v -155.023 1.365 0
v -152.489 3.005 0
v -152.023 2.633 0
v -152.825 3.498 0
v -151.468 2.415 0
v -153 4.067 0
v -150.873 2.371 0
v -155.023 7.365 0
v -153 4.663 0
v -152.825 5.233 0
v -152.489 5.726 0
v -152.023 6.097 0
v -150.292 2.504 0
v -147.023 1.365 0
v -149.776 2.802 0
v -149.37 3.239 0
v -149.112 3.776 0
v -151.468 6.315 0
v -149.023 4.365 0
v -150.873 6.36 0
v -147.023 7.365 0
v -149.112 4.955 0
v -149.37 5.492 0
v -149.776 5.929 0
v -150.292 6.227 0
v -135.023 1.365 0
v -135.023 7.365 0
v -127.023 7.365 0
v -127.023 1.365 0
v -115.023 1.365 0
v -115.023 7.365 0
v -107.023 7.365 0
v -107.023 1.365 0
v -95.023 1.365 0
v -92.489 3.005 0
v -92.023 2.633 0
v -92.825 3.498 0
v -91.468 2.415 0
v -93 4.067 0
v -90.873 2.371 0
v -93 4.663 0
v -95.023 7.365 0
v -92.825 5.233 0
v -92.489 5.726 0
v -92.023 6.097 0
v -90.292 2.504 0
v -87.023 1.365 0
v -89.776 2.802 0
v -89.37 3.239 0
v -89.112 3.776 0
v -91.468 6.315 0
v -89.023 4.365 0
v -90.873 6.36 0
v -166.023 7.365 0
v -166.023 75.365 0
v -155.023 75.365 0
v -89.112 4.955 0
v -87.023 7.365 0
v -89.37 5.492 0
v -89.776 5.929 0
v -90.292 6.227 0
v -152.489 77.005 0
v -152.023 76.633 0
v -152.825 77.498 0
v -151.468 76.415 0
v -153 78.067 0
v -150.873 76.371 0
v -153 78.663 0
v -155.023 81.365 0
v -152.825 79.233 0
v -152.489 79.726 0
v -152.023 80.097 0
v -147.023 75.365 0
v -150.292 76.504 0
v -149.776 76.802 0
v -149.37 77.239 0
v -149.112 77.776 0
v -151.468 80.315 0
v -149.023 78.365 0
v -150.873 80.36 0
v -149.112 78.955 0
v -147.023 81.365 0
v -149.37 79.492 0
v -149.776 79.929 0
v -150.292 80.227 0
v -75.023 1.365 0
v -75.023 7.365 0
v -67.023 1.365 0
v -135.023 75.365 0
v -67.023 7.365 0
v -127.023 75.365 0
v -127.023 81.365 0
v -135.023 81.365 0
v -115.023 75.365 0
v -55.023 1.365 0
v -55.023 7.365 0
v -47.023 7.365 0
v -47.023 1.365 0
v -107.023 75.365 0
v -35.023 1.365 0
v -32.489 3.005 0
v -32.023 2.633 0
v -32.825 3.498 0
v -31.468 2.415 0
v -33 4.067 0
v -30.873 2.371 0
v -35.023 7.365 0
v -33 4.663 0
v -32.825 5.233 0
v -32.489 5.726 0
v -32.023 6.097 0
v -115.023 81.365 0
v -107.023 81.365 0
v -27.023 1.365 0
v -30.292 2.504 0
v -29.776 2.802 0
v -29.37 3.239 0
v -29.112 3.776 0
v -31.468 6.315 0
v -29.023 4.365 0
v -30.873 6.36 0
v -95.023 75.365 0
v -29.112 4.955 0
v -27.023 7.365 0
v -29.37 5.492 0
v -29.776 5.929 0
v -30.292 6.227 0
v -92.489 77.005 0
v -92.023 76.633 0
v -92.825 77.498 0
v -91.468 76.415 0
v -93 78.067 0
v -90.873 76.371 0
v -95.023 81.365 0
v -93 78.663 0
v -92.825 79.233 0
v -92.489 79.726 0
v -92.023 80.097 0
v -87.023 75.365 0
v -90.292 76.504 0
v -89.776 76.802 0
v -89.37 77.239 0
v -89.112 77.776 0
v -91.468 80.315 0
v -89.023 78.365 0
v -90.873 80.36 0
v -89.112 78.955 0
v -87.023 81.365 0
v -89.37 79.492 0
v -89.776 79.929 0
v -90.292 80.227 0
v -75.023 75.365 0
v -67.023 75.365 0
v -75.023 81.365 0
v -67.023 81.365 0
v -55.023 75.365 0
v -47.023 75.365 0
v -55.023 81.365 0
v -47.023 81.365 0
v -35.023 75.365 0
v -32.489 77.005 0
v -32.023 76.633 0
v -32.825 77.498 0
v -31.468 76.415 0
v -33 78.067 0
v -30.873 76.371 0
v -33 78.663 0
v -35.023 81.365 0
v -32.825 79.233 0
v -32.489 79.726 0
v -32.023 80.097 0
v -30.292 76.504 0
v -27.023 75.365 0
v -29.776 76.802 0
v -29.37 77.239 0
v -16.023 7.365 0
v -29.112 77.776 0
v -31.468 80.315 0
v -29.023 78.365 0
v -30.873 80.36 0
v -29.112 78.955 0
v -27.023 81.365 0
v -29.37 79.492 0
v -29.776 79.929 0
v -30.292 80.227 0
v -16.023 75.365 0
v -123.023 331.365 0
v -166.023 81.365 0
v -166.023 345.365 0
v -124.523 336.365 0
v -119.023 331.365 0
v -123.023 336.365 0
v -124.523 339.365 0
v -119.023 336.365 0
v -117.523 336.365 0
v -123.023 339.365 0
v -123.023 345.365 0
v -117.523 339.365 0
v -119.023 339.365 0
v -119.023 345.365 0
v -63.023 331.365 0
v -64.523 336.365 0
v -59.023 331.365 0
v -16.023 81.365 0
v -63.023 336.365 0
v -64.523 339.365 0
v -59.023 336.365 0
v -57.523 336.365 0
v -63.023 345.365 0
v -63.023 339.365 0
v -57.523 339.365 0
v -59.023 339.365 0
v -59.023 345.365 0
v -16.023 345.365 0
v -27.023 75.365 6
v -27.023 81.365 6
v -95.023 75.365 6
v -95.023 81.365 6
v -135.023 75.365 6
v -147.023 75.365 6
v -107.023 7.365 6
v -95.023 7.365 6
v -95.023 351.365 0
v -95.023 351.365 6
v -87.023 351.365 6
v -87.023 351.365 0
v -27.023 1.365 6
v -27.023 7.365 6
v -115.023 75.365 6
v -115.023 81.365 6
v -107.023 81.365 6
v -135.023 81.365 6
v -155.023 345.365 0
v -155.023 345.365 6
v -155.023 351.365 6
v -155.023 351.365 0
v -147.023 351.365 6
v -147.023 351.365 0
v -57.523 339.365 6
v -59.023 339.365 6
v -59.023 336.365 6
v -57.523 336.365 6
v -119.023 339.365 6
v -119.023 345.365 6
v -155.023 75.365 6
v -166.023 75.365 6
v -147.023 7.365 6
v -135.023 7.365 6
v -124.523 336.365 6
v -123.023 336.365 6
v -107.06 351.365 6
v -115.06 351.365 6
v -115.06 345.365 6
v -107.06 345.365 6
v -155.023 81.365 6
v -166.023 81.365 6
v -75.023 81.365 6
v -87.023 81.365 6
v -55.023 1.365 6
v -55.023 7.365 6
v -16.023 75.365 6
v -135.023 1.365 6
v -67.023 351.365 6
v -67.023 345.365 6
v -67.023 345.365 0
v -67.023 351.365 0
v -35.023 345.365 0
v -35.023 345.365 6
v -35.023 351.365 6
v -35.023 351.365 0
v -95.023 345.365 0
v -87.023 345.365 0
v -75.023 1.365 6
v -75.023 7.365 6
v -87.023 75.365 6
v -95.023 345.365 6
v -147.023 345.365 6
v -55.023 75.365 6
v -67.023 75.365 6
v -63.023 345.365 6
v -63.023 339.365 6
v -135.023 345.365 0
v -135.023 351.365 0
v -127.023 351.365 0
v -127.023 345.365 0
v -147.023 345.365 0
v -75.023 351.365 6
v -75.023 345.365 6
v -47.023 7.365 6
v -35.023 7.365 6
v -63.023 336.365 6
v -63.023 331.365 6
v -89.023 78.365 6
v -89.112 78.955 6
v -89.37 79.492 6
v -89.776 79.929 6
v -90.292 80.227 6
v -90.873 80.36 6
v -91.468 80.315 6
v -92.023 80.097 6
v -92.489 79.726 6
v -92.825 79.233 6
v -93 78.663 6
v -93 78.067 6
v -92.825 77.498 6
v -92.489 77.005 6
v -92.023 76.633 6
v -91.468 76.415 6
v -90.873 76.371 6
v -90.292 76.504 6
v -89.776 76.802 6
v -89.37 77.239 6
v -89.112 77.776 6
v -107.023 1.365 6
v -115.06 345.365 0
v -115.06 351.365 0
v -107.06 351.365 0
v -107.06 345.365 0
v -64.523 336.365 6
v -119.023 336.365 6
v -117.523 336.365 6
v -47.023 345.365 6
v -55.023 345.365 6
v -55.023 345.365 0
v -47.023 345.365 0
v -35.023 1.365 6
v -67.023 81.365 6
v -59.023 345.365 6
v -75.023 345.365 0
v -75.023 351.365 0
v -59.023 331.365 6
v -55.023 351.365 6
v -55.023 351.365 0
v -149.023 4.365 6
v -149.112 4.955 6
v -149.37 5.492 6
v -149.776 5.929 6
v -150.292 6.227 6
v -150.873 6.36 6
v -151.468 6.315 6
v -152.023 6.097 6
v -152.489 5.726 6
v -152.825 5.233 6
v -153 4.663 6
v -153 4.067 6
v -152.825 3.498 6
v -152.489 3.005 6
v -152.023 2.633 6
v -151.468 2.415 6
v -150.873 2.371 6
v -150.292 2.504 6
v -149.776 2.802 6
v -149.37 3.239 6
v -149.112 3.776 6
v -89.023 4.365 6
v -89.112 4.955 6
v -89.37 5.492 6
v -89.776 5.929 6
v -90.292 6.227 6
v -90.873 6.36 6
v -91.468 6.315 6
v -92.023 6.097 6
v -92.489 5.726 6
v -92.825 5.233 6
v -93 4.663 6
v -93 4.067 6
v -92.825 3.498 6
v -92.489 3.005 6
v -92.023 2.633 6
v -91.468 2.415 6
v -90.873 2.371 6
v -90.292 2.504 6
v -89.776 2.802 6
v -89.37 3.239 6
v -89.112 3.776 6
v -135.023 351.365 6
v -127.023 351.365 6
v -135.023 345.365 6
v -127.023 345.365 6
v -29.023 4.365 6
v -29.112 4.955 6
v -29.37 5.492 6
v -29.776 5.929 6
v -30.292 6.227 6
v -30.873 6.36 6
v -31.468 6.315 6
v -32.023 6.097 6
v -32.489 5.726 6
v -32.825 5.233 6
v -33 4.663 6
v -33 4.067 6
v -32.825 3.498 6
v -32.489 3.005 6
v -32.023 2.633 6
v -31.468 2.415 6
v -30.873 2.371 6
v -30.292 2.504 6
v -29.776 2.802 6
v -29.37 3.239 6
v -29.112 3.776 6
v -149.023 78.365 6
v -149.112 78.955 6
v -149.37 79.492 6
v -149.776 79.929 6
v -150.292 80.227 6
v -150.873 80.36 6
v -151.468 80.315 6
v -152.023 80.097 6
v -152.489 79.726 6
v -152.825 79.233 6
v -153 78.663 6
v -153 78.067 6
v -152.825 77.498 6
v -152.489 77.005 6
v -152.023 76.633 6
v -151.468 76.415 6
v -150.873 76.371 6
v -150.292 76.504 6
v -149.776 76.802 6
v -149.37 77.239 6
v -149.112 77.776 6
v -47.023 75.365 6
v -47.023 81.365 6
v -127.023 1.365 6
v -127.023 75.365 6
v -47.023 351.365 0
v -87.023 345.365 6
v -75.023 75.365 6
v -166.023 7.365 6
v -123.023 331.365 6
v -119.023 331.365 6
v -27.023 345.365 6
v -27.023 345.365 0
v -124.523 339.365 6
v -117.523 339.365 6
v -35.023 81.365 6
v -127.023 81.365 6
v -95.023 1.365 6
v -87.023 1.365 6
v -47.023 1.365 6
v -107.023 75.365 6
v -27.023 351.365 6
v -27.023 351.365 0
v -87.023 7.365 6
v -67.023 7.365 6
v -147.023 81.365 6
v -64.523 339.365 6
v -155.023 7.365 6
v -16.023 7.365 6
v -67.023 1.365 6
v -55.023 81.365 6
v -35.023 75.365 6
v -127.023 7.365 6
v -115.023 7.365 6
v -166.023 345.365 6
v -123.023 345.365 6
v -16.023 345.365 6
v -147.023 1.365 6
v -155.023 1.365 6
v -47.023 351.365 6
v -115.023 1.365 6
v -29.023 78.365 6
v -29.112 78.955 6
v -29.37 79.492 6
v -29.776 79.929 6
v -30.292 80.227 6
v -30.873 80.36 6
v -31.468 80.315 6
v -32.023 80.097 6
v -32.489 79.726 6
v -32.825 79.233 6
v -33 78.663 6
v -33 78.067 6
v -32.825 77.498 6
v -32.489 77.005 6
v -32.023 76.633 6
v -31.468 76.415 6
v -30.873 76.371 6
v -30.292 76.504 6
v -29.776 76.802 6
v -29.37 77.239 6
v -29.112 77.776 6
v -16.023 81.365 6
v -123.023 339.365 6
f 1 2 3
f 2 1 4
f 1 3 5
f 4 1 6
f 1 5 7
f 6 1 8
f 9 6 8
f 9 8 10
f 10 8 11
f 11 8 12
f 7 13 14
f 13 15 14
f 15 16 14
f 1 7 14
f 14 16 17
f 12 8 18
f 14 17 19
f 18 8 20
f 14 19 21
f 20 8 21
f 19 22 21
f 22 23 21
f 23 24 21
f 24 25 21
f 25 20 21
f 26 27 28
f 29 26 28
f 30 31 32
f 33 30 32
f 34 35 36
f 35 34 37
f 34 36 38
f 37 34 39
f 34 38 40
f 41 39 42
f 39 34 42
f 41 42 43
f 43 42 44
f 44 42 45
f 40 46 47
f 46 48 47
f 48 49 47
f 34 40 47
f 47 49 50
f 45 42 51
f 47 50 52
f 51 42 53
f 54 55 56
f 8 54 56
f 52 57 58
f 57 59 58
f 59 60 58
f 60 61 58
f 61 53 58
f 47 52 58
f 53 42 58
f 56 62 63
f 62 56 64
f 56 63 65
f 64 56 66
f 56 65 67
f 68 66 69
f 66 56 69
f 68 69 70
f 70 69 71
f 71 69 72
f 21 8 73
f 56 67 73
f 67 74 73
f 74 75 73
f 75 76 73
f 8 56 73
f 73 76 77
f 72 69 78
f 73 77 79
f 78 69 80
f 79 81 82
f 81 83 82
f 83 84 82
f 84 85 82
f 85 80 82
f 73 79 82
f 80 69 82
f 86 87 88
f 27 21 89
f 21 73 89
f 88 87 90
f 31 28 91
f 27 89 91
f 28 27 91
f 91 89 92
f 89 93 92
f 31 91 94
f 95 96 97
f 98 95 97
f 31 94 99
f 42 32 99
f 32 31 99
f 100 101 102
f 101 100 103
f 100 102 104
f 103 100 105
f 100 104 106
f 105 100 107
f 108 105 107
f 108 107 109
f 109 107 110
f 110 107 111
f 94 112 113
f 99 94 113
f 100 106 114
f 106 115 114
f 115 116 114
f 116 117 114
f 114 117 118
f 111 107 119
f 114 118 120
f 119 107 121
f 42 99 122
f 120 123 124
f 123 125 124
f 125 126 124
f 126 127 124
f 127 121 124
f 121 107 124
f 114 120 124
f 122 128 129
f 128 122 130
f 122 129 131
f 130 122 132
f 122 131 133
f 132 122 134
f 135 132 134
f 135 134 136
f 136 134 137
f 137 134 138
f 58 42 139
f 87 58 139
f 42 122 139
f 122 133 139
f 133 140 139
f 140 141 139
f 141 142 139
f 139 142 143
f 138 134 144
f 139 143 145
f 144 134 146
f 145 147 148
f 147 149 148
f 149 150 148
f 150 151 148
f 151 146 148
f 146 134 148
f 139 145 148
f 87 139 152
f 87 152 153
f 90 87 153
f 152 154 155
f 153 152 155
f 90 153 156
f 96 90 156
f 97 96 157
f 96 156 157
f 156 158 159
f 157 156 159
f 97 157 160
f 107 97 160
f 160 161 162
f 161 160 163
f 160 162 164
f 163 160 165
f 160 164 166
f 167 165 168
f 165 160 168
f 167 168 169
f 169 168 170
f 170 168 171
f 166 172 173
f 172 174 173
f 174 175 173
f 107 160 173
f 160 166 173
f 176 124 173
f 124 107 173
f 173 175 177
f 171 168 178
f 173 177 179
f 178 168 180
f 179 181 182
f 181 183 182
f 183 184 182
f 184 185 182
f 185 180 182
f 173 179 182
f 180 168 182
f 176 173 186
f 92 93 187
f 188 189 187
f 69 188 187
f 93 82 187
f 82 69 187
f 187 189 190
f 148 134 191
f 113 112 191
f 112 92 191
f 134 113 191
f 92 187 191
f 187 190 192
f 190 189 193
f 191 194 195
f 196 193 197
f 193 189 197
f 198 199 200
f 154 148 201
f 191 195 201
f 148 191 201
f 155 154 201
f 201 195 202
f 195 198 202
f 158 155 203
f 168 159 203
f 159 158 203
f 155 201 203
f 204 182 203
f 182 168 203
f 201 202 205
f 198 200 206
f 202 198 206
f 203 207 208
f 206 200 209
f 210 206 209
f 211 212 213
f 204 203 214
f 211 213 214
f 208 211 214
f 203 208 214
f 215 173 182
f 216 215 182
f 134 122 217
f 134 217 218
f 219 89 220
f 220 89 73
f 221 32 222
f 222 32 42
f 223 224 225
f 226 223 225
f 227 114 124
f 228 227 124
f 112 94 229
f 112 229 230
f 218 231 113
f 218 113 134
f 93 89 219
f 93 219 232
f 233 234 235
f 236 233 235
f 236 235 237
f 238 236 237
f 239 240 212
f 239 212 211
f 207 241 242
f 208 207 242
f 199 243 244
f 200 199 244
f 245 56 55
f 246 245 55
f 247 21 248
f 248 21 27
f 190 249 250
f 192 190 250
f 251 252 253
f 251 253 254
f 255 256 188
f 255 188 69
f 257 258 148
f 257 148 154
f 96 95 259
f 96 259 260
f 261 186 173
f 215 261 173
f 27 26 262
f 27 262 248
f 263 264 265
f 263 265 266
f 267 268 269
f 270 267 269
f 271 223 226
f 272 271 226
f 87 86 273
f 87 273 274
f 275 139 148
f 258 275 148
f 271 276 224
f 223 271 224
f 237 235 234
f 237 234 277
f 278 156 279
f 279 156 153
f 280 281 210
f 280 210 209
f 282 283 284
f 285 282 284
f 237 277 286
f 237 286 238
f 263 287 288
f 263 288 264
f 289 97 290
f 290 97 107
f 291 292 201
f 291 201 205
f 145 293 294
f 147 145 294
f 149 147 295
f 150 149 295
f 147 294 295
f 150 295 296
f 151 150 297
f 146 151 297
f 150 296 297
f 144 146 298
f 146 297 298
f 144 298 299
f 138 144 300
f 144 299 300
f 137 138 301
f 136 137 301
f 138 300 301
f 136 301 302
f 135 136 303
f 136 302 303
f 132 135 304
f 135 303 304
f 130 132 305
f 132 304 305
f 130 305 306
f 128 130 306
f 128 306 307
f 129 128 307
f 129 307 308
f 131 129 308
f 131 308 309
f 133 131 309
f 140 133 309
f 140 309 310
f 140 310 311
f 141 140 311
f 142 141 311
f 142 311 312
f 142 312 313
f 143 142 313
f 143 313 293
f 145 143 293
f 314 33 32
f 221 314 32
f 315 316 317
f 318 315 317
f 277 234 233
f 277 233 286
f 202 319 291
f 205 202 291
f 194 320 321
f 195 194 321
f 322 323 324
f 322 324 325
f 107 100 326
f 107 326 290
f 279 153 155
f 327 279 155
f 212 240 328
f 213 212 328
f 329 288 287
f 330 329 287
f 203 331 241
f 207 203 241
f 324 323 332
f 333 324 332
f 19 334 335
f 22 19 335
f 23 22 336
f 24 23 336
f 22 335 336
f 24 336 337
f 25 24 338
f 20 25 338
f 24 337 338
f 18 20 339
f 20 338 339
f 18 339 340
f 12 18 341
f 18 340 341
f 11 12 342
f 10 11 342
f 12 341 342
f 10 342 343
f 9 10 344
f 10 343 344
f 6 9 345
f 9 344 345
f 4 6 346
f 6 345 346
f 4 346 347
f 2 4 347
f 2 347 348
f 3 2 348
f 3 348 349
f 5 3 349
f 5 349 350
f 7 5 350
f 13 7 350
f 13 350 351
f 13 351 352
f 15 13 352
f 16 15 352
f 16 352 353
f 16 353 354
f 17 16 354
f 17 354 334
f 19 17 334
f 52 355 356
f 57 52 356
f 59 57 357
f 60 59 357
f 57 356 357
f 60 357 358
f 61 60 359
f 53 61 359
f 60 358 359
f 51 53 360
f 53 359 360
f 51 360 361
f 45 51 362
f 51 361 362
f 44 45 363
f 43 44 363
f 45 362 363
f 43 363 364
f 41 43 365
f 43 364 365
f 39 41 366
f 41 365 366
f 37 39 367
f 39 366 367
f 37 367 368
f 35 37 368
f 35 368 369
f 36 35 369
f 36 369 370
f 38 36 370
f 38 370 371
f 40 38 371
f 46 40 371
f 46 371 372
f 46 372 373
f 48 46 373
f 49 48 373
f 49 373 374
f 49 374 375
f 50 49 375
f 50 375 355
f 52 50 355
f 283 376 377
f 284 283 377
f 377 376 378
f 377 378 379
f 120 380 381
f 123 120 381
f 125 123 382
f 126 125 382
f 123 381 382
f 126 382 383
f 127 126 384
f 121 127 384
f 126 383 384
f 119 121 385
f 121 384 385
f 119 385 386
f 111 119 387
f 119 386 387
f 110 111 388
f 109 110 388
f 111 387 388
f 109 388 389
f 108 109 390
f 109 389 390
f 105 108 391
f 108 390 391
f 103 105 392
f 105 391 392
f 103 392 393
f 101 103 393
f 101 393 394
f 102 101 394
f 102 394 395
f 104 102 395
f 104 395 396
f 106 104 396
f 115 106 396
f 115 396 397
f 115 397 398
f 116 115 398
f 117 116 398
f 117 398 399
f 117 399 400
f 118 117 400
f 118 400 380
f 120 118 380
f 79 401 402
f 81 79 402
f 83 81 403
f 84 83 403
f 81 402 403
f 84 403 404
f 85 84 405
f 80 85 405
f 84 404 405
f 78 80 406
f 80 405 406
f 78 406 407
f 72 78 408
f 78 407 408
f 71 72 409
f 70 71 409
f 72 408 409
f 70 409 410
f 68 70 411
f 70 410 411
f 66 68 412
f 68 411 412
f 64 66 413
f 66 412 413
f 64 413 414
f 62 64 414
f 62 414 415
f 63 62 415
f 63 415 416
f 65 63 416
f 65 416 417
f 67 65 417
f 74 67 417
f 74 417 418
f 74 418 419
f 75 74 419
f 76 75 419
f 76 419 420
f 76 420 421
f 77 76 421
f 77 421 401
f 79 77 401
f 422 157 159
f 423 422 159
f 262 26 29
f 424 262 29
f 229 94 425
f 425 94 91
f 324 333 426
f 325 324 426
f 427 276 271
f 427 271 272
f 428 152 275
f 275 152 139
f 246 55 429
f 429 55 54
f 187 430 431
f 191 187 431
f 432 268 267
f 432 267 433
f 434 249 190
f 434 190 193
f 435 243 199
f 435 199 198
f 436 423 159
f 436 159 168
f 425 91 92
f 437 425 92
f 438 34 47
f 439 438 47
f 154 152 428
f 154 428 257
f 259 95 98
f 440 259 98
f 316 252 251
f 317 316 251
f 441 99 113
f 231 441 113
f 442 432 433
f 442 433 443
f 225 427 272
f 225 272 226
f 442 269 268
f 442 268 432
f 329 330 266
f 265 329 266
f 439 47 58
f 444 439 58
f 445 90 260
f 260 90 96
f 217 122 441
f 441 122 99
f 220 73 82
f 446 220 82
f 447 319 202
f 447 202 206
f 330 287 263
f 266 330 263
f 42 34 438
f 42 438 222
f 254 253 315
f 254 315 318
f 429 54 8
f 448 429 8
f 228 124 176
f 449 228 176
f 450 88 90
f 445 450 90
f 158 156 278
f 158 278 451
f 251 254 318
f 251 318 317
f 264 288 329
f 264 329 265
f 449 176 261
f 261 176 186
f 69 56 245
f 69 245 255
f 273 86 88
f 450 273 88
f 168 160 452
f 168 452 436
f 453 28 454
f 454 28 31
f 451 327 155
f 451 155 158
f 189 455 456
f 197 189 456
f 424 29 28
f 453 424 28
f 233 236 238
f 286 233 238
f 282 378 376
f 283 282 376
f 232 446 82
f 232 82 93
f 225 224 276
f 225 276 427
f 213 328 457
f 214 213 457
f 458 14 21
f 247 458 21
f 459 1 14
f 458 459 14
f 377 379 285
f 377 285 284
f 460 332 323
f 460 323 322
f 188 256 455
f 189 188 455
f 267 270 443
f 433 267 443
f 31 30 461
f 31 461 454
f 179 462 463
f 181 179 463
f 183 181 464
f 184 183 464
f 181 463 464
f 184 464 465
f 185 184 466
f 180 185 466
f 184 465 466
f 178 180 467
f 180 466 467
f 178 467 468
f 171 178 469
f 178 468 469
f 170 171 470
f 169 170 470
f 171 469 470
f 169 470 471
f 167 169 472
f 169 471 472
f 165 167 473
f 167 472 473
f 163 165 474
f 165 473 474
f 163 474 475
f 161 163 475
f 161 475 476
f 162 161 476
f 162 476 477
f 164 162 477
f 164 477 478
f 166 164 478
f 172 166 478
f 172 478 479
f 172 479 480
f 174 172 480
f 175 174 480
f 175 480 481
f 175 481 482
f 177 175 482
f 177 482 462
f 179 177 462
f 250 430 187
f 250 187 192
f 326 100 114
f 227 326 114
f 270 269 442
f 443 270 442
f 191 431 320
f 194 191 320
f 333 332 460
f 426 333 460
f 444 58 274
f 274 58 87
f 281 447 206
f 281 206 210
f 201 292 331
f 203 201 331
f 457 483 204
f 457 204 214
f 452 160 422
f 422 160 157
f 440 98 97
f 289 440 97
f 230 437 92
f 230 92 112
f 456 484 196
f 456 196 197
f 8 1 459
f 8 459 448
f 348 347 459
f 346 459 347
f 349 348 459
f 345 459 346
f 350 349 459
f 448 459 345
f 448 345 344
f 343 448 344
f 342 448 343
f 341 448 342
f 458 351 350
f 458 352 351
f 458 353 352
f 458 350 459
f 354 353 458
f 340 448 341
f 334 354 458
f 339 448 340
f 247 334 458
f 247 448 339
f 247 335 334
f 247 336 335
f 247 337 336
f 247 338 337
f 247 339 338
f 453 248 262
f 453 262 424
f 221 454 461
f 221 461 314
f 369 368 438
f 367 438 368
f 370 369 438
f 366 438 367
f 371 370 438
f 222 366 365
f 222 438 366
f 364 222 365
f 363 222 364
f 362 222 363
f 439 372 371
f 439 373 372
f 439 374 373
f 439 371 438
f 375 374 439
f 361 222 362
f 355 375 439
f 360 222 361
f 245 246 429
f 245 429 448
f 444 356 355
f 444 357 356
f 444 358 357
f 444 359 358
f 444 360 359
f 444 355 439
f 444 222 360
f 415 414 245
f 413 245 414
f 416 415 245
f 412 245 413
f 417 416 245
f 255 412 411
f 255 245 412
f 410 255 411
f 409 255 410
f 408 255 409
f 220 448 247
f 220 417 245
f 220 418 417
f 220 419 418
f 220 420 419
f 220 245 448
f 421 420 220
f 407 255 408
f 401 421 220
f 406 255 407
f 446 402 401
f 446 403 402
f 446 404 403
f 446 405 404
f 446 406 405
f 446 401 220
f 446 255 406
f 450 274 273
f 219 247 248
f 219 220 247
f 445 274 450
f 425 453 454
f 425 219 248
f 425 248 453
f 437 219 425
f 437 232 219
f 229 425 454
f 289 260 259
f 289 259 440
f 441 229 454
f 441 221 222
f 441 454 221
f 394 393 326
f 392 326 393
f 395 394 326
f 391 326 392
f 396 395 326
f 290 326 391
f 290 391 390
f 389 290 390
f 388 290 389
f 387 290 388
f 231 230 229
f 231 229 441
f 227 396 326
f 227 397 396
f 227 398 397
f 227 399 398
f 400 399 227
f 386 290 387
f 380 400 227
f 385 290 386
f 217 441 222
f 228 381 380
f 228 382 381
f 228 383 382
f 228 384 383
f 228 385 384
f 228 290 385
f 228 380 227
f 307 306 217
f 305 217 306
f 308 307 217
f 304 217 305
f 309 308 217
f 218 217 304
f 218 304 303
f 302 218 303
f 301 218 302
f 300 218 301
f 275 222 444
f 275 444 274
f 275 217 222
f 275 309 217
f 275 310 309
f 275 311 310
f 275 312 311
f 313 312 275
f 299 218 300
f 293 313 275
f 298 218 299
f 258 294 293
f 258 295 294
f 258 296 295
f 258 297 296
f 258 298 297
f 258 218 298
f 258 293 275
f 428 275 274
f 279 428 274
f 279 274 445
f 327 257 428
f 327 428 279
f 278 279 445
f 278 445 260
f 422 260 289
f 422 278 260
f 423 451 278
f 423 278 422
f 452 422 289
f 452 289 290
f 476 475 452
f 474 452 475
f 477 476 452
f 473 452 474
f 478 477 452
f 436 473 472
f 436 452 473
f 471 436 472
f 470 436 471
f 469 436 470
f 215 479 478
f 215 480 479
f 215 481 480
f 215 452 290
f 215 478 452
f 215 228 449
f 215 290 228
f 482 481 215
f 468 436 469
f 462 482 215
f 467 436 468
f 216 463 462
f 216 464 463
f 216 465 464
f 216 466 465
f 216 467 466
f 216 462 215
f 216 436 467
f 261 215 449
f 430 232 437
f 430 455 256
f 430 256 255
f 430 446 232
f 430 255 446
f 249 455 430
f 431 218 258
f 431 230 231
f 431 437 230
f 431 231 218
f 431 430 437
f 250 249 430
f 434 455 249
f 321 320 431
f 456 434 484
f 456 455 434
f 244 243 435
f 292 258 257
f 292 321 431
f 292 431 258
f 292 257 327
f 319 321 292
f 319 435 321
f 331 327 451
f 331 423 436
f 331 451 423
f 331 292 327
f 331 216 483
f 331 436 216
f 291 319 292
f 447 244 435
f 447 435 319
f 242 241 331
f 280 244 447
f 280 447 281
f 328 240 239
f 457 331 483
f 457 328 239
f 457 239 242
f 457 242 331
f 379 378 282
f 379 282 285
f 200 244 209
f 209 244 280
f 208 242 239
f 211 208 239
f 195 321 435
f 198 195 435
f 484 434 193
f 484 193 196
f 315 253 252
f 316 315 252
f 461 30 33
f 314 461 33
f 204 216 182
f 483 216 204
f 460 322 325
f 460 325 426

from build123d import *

# Parameters (mm, degrees)
ESQUISSE1_W             = 8
ESQUISSE1_H             = 6
BOSS_EXTRU_1_DEPTH      = 6
ESQUISSE2_W             = 150
ESQUISSE2_H             = 264
BOSS_EXTRU_2_DEPTH      = 6
ESQUISSE3_W             = 8
ESQUISSE3_H             = 6
BOSS_EXTRU_3_DEPTH      = 6
BOSS_EXTRU_3_2_DEPTH    = 6
BOSS_EXTRU_3_3_DEPTH    = 6
BOSS_EXTRU_3_4_DEPTH    = 6
BOSS_EXTRU_3_5_DEPTH    = 6
BOSS_EXTRU_3_6_DEPTH    = 6
BOSS_EXTRU_3_7_DEPTH    = 6
ESQUISSE4_R             = 2
ENL_V_MAT_EXTRU_1_DEPTH = 389.660661272
ESQUISSE5_R             = 2
ENL_V_MAT_EXTRU_2_DEPTH = 389.660661272
ESQUISSE6_W             = 4
ESQUISSE6_H             = 14
ESQUISSE6_W_2           = 7
ESQUISSE6_H_2           = 3
ENL_V_MAT_EXTRU_3_DEPTH = 389.660661272


with BuildPart() as part:
    # Esquisse1 → Boss.-Extru.1 (new body)
    with BuildSketch(Plane.XY):
        with Locations((-151.022684861, 78.365305248)):
            Rectangle(ESQUISSE1_W, ESQUISSE1_H)
        with Locations((-131.022684861, 78.365305248)):
            Rectangle(ESQUISSE1_W, ESQUISSE1_H)
        with Locations((-111.022684861, 78.365305248)):
            Rectangle(ESQUISSE1_W, ESQUISSE1_H)
        with Locations((-91.022684861, 78.365305248)):
            Rectangle(ESQUISSE1_W, ESQUISSE1_H)
        with Locations((-71.022684861, 78.365305248)):
            Rectangle(ESQUISSE1_W, ESQUISSE1_H)
        with Locations((-51.022684861, 78.365305248)):
            Rectangle(ESQUISSE1_W, ESQUISSE1_H)
        with Locations((-31.022684861, 78.365305248)):
            Rectangle(ESQUISSE1_W, ESQUISSE1_H)
        with Locations((-31.022684861, 4.365305248)):
            Rectangle(ESQUISSE1_W, ESQUISSE1_H)
        with Locations((-51.022684861, 4.365305248)):
            Rectangle(ESQUISSE1_W, ESQUISSE1_H)
        with Locations((-71.022684861, 4.365305248)):
            Rectangle(ESQUISSE1_W, ESQUISSE1_H)
        with Locations((-91.022684861, 4.365305248)):
            Rectangle(ESQUISSE1_W, ESQUISSE1_H)
        with Locations((-111.022684861, 4.365305248)):
            Rectangle(ESQUISSE1_W, ESQUISSE1_H)
        with Locations((-131.022684861, 4.365305248)):
            Rectangle(ESQUISSE1_W, ESQUISSE1_H)
        with Locations((-151.022684861, 4.365305248)):
            Rectangle(ESQUISSE1_W, ESQUISSE1_H)
        Polygon((-166.022684861, 41.365305248), (-166.022684861, 7.365305248), (-155.022684861, 7.365305248), (-147.022684861, 7.365305248), (-135.022684861, 7.365305248), (-127.022684861, 7.365305248), (-115.022684861, 7.365305248), (-107.022684861, 7.365305248), (-95.022684861, 7.365305248), (-87.022684861, 7.365305248), (-75.022684861, 7.365305248), (-67.022684861, 7.365305248), (-55.022684861, 7.365305248), (-47.022684861, 7.365305248), (-35.022684861, 7.365305248), (-27.022684861, 7.365305248), (-16.022684861, 7.365305248), (-16.022684861, 41.365305248), align=None)
        Polygon((-166.022684861, 75.365305248), (-166.022684861, 41.365305248), (-16.022684861, 41.365305248), (-16.022684861, 75.365305248), (-27.022684861, 75.365305248), (-35.022684861, 75.365305248), (-47.022684861, 75.365305248), (-55.022684861, 75.365305248), (-67.022684861, 75.365305248), (-75.022684861, 75.365305248), (-87.022684861, 75.365305248), (-95.022684861, 75.365305248), (-107.022684861, 75.365305248), (-115.022684861, 75.365305248), (-127.022684861, 75.365305248), (-135.022684861, 75.365305248), (-147.022684861, 75.365305248), (-155.022684861, 75.365305248), align=None)
    extrude(amount=BOSS_EXTRU_1_DEPTH)

    # Esquisse2 → Boss.-Extru.2 (add)
    with BuildSketch(Plane.XY.offset(6)):
        with Locations((-91.022684861, 213.365305248)):
            Rectangle(ESQUISSE2_W, ESQUISSE2_H)
    extrude(amount=-BOSS_EXTRU_2_DEPTH)

    # Esquisse4 → Enlèv. mat.-Extru.1 (cut, through all)
    with BuildSketch(Plane.XY.offset(6)):
        with Locations((-31.022684861, 78.365305248)):
            Circle(ESQUISSE4_R)
        with Locations((-151.022684861, 78.365305248)):
            Circle(ESQUISSE4_R)
        with Locations((-91.022684861, 78.365305248)):
            Circle(ESQUISSE4_R)
    extrude(amount=-ENL_V_MAT_EXTRU_1_DEPTH, mode=Mode.SUBTRACT)

    # Esquisse5 → Enlèv. mat.-Extru.2 (cut, through all)
    with BuildSketch(Plane.XY.offset(6)):
        with Locations((-151.022684861, 4.365305248)):
            Circle(ESQUISSE5_R)
        with Locations((-91.022684861, 4.365305248)):
            Circle(ESQUISSE5_R)
        with Locations((-31.022684861, 4.365305248)):
            Circle(ESQUISSE5_R)
    extrude(amount=-ENL_V_MAT_EXTRU_2_DEPTH, mode=Mode.SUBTRACT)

    # Esquisse6 → Enlèv. mat.-Extru.3 (cut, through all)
    with BuildSketch(Plane.XY.offset(6)):
        with Locations((-121.022684861, 338.365305248)):
            Rectangle(ESQUISSE6_W, ESQUISSE6_H)
        with Locations((-121.022684861, 337.865305248)):
            Rectangle(ESQUISSE6_W_2, ESQUISSE6_H_2)
        with Locations((-61.022684861, 338.365305248)):
            Rectangle(ESQUISSE6_W, ESQUISSE6_H)
        with Locations((-61.022684861, 337.865305248)):
            Rectangle(ESQUISSE6_W_2, ESQUISSE6_H_2)
    extrude(amount=-ENL_V_MAT_EXTRU_3_DEPTH, mode=Mode.SUBTRACT)


with BuildPart() as body_2:
    # Esquisse3 → Boss.-Extru.3 (new body)
    with BuildSketch(Plane.XY.offset(6)):
        with Locations((-151.022684861, 348.365305248)):
            Rectangle(ESQUISSE3_W, ESQUISSE3_H)
    extrude(amount=-BOSS_EXTRU_3_DEPTH)


with BuildPart() as body_3:
    # Esquisse3 → Boss.-Extru.3 2 (new body)
    with BuildSketch(Plane.XY.offset(6)):
        with Locations((-131.022684861, 348.365305248)):
            Rectangle(ESQUISSE3_W, ESQUISSE3_H)
    extrude(amount=-BOSS_EXTRU_3_2_DEPTH)


with BuildPart() as body_4:
    # Esquisse3 → Boss.-Extru.3 3 (new body)
    with BuildSketch(Plane.XY.offset(6)):
        with Locations((-111.059834835, 348.365305248)):
            Rectangle(ESQUISSE3_W, ESQUISSE3_H)
    extrude(amount=-BOSS_EXTRU_3_3_DEPTH)


with BuildPart() as body_5:
    # Esquisse3 → Boss.-Extru.3 4 (new body)
    with BuildSketch(Plane.XY.offset(6)):
        with Locations((-91.022684861, 348.365305248)):
            Rectangle(ESQUISSE3_W, ESQUISSE3_H)
    extrude(amount=-BOSS_EXTRU_3_4_DEPTH)


with BuildPart() as body_6:
    # Esquisse3 → Boss.-Extru.3 5 (new body)
    with BuildSketch(Plane.XY.offset(6)):
        with Locations((-71.022684861, 348.365305248)):
            Rectangle(ESQUISSE3_W, ESQUISSE3_H)
    extrude(amount=-BOSS_EXTRU_3_5_DEPTH)


with BuildPart() as body_7:
    # Esquisse3 → Boss.-Extru.3 6 (new body)
    with BuildSketch(Plane.XY.offset(6)):
        with Locations((-51.022684861, 348.365305248)):
            Rectangle(ESQUISSE3_W, ESQUISSE3_H)
    extrude(amount=-BOSS_EXTRU_3_6_DEPTH)


with BuildPart() as body_8:
    # Esquisse3 → Boss.-Extru.3 7 (new body)
    with BuildSketch(Plane.XY.offset(6)):
        with Locations((-31.022684861, 348.365305248)):
            Rectangle(ESQUISSE3_W, ESQUISSE3_H)
    extrude(amount=-BOSS_EXTRU_3_7_DEPTH)


solid = Compound([part.part, body_2.part, body_3.part, body_4.part, body_5.part, body_6.part, body_7.part, body_8.part])
